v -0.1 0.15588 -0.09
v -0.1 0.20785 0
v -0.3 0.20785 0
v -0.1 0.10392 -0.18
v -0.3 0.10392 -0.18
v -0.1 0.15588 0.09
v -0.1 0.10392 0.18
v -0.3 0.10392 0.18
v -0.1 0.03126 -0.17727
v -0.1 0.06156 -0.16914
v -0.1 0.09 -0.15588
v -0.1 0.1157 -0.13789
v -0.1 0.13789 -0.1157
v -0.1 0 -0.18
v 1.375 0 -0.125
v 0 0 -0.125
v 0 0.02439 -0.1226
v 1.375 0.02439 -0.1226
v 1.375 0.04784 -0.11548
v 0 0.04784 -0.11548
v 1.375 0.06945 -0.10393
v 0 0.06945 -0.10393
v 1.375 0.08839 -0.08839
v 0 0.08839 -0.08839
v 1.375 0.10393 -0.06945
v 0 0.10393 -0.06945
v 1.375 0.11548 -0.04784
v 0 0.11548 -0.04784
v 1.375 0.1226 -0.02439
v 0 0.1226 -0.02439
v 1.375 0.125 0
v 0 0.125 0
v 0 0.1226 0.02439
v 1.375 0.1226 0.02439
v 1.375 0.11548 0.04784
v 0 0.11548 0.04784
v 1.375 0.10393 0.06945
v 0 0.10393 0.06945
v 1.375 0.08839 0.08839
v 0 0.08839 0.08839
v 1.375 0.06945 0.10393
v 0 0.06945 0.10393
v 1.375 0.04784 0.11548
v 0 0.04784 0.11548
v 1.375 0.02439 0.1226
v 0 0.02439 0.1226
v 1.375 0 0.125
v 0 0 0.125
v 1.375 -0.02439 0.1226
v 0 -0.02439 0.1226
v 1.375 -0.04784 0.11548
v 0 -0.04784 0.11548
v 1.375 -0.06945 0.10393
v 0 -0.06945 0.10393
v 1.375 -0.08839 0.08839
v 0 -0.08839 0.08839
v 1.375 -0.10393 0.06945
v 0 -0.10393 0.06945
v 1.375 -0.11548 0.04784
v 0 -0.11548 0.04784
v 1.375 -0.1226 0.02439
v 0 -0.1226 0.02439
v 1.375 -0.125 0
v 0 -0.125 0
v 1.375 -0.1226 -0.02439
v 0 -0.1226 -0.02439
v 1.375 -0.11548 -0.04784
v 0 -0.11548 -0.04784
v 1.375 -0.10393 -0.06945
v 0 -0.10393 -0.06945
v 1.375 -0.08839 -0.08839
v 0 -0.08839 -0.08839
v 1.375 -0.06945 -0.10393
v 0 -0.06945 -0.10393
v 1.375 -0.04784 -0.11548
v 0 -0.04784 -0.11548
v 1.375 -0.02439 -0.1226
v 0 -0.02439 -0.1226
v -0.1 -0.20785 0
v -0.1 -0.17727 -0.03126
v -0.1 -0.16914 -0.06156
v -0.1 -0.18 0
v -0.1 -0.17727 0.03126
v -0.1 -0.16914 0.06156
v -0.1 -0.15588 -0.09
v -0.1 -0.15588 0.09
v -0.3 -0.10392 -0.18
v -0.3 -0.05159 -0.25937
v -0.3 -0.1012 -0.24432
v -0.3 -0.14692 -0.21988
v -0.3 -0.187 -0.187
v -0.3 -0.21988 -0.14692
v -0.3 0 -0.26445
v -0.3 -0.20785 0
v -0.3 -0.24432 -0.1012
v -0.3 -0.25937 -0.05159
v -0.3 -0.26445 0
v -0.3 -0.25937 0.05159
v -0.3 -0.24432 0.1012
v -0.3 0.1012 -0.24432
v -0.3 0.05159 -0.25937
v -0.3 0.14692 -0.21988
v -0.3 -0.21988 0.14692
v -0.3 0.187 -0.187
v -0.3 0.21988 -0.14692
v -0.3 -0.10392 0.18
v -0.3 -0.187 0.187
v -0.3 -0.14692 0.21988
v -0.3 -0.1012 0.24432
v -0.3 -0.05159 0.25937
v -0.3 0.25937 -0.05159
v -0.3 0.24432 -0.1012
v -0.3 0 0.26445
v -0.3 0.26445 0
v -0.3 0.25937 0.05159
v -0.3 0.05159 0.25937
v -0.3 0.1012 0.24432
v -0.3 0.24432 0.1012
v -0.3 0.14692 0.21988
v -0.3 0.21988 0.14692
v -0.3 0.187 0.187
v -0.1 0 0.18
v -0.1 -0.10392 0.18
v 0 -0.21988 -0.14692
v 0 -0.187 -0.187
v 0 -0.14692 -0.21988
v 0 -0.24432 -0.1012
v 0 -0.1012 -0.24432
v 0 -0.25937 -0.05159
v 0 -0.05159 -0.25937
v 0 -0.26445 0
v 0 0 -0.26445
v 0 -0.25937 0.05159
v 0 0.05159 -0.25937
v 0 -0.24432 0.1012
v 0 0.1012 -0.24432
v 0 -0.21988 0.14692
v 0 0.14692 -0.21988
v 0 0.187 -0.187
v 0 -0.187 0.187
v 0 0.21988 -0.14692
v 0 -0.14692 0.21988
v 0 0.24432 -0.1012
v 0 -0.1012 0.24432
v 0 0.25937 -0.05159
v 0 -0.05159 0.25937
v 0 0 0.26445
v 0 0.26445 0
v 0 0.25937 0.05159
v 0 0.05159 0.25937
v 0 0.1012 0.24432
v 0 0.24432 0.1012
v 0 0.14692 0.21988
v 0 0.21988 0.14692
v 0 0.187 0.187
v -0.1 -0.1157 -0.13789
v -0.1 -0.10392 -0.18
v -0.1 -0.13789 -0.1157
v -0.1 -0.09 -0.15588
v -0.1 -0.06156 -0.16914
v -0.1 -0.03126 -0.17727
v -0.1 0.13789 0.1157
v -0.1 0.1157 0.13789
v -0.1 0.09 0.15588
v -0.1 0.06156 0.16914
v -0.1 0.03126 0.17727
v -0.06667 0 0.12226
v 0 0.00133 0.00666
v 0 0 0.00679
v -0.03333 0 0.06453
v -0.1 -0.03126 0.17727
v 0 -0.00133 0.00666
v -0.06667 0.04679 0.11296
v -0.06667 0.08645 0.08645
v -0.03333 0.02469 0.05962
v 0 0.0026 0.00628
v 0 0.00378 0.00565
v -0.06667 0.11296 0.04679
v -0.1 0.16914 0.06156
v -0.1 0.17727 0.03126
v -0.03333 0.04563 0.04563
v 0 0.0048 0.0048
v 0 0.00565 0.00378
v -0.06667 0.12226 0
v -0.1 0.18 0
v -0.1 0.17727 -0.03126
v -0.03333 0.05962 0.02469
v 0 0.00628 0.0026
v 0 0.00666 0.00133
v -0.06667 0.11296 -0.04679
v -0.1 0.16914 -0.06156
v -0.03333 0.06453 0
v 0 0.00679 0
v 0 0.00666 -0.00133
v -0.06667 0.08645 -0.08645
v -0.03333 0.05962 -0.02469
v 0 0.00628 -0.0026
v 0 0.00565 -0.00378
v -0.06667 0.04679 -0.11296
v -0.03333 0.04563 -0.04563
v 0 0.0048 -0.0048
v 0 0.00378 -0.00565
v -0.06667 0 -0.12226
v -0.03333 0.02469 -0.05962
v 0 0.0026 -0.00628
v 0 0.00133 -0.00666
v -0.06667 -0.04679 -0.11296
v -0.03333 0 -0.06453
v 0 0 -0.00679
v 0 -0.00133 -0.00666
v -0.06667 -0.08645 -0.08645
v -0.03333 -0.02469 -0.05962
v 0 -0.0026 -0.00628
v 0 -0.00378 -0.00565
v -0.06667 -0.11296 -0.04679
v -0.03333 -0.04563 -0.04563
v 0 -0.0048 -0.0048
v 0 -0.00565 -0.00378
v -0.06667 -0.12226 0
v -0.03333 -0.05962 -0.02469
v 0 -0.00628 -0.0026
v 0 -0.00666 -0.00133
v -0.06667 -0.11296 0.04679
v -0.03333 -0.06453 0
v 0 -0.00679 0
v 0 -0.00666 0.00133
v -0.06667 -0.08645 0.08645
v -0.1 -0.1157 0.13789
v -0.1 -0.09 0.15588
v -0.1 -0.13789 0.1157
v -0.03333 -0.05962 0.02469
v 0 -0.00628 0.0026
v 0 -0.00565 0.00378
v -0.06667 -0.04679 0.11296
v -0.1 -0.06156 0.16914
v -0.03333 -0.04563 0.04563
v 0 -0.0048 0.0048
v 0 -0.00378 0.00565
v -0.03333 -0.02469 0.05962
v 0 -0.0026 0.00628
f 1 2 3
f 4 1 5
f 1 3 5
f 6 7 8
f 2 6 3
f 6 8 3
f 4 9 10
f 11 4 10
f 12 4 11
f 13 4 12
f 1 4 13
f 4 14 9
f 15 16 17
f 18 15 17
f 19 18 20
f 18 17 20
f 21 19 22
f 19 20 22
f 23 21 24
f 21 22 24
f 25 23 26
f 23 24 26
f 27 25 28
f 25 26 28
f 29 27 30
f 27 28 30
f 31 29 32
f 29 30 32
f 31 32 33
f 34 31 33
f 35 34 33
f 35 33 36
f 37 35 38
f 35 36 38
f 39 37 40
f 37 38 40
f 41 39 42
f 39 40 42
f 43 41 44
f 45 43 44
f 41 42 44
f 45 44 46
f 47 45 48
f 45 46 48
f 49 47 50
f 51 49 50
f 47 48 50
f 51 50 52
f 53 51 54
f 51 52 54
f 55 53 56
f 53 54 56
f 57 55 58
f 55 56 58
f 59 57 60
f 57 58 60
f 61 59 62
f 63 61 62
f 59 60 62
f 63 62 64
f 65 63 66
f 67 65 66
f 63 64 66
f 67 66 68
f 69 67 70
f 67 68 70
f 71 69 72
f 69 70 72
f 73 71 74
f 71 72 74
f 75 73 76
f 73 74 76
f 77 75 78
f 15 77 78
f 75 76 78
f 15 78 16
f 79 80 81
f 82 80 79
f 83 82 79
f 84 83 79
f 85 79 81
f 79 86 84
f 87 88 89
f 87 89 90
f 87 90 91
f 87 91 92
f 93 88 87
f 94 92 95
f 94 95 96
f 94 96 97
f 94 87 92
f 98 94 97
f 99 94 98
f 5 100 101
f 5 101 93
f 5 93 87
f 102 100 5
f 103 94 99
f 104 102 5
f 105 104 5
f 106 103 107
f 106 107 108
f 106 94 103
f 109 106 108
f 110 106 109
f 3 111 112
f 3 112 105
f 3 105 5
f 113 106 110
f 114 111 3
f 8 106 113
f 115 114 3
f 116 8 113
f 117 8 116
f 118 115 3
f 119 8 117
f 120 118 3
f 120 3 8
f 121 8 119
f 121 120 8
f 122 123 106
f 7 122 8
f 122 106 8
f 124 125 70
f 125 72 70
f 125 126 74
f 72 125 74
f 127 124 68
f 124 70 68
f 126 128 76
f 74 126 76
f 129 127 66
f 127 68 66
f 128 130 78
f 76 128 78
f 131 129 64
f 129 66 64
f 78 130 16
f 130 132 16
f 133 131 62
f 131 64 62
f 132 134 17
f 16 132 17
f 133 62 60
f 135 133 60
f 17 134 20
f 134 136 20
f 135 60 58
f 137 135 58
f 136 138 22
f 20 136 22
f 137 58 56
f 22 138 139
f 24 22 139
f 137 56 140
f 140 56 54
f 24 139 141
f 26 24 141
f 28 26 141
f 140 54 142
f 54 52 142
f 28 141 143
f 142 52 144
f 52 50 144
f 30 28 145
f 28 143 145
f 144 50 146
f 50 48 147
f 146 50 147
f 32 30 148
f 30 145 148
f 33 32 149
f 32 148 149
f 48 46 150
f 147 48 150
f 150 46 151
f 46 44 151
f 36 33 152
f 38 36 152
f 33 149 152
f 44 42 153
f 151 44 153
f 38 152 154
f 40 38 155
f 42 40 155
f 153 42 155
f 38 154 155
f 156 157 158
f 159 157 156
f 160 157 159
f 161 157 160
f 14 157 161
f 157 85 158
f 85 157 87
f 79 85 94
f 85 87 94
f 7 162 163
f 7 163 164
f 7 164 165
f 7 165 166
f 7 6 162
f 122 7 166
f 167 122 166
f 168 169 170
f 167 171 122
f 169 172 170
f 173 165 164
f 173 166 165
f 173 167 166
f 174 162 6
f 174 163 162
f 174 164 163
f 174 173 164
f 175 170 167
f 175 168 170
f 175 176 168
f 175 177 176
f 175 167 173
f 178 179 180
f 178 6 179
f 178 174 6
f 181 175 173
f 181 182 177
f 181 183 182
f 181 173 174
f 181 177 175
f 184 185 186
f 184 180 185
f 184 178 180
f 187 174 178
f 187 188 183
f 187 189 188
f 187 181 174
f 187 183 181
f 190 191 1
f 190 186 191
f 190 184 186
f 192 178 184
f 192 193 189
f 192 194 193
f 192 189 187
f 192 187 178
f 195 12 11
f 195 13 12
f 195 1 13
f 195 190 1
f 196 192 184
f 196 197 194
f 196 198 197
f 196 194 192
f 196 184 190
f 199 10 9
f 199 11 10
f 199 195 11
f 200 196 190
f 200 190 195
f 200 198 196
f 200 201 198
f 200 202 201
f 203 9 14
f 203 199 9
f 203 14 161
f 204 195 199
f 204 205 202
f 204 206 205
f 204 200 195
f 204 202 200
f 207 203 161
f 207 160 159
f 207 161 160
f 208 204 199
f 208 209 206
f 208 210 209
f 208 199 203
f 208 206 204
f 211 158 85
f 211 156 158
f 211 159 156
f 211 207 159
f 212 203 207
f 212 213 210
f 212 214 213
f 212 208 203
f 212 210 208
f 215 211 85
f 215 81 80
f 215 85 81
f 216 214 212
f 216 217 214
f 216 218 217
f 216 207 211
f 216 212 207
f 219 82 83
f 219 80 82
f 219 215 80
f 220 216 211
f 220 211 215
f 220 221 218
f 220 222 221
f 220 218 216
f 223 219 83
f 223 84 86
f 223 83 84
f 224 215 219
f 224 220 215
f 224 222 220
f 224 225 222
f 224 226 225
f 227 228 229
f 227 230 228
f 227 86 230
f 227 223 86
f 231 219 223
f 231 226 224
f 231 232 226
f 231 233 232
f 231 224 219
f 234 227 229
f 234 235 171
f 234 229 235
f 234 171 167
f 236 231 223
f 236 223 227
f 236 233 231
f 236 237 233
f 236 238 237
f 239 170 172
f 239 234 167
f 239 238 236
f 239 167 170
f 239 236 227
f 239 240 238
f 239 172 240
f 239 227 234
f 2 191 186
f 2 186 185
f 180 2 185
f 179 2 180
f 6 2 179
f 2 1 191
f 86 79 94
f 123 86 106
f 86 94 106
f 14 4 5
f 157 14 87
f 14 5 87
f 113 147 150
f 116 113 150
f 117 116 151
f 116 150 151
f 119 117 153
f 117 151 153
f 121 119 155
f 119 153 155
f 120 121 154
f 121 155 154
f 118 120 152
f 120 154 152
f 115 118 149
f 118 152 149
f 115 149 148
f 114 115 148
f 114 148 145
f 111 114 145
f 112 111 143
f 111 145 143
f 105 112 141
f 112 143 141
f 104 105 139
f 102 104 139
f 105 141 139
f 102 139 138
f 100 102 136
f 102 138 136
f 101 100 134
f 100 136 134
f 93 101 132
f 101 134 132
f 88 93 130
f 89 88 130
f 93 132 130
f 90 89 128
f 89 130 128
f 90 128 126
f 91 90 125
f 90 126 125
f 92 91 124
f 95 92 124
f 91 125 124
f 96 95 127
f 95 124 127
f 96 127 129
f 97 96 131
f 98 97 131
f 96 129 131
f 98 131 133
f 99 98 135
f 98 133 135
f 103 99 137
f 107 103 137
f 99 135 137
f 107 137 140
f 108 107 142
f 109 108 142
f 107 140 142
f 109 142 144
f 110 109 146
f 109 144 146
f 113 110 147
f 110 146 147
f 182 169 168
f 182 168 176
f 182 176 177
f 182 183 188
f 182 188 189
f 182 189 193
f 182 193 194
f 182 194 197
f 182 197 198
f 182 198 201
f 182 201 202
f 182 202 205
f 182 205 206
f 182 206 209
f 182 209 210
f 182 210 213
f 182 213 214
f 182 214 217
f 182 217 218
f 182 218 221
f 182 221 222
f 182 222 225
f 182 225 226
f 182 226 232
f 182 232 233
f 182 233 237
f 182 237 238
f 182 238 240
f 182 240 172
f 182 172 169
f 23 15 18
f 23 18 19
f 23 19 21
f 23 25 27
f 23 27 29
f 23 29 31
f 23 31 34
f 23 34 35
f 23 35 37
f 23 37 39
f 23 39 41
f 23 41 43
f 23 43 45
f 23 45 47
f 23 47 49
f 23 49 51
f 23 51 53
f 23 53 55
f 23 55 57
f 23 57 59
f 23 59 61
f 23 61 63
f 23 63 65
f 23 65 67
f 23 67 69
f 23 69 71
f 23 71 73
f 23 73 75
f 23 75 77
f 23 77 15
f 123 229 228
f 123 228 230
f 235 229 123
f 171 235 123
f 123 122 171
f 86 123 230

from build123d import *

# Parameters (mm, degrees)
SKETCH1_R           = 0.125
BOSS_EXTRUDE1_DEPTH = 1.375
SKETCH2_R           = 0.264451341
BOSS_EXTRUDE2_DEPTH = 0.3
CUT_EXTRUDE1_DEPTH  = 0.2
SKETCH4_R           = 0.18
CUT_EXTRUDE2_DEPTH  = 0.1
CUT_EXTRUDE2_TAPER  = 60


with BuildPart() as part:
    # Sketch1 → Boss-Extrude1 (new body)
    with BuildSketch(Plane(origin=(0, 0, 0), x_dir=(0, 0, -1), z_dir=(1, 0, 0))):
        Circle(SKETCH1_R)
    extrude(amount=BOSS_EXTRUDE1_DEPTH)

    # Sketch2 → Boss-Extrude2 (add)
    with BuildSketch(Plane.ZY):
        Circle(SKETCH2_R)
    extrude(amount=BOSS_EXTRUDE2_DEPTH)

    # Sketch3 → Cut-Extrude1 (cut)
    with BuildSketch(Plane.ZY.offset(0.3)):
        Polygon((0, 0.207846097), (-0.18, 0.103923048), (-0.18, -0.103923048), (0, -0.207846097), (0.18, -0.103923048), (0.18, 0.103923048), align=None)
    extrude(amount=-CUT_EXTRUDE1_DEPTH, mode=Mode.SUBTRACT)

    # Sketch4 → Cut-Extrude2 (cut)
    with BuildSketch(Plane.ZY.offset(0.1)):
        Circle(SKETCH4_R)
    extrude(amount=-CUT_EXTRUDE2_DEPTH, taper=CUT_EXTRUDE2_TAPER, mode=Mode.SUBTRACT)


solid = part.part
